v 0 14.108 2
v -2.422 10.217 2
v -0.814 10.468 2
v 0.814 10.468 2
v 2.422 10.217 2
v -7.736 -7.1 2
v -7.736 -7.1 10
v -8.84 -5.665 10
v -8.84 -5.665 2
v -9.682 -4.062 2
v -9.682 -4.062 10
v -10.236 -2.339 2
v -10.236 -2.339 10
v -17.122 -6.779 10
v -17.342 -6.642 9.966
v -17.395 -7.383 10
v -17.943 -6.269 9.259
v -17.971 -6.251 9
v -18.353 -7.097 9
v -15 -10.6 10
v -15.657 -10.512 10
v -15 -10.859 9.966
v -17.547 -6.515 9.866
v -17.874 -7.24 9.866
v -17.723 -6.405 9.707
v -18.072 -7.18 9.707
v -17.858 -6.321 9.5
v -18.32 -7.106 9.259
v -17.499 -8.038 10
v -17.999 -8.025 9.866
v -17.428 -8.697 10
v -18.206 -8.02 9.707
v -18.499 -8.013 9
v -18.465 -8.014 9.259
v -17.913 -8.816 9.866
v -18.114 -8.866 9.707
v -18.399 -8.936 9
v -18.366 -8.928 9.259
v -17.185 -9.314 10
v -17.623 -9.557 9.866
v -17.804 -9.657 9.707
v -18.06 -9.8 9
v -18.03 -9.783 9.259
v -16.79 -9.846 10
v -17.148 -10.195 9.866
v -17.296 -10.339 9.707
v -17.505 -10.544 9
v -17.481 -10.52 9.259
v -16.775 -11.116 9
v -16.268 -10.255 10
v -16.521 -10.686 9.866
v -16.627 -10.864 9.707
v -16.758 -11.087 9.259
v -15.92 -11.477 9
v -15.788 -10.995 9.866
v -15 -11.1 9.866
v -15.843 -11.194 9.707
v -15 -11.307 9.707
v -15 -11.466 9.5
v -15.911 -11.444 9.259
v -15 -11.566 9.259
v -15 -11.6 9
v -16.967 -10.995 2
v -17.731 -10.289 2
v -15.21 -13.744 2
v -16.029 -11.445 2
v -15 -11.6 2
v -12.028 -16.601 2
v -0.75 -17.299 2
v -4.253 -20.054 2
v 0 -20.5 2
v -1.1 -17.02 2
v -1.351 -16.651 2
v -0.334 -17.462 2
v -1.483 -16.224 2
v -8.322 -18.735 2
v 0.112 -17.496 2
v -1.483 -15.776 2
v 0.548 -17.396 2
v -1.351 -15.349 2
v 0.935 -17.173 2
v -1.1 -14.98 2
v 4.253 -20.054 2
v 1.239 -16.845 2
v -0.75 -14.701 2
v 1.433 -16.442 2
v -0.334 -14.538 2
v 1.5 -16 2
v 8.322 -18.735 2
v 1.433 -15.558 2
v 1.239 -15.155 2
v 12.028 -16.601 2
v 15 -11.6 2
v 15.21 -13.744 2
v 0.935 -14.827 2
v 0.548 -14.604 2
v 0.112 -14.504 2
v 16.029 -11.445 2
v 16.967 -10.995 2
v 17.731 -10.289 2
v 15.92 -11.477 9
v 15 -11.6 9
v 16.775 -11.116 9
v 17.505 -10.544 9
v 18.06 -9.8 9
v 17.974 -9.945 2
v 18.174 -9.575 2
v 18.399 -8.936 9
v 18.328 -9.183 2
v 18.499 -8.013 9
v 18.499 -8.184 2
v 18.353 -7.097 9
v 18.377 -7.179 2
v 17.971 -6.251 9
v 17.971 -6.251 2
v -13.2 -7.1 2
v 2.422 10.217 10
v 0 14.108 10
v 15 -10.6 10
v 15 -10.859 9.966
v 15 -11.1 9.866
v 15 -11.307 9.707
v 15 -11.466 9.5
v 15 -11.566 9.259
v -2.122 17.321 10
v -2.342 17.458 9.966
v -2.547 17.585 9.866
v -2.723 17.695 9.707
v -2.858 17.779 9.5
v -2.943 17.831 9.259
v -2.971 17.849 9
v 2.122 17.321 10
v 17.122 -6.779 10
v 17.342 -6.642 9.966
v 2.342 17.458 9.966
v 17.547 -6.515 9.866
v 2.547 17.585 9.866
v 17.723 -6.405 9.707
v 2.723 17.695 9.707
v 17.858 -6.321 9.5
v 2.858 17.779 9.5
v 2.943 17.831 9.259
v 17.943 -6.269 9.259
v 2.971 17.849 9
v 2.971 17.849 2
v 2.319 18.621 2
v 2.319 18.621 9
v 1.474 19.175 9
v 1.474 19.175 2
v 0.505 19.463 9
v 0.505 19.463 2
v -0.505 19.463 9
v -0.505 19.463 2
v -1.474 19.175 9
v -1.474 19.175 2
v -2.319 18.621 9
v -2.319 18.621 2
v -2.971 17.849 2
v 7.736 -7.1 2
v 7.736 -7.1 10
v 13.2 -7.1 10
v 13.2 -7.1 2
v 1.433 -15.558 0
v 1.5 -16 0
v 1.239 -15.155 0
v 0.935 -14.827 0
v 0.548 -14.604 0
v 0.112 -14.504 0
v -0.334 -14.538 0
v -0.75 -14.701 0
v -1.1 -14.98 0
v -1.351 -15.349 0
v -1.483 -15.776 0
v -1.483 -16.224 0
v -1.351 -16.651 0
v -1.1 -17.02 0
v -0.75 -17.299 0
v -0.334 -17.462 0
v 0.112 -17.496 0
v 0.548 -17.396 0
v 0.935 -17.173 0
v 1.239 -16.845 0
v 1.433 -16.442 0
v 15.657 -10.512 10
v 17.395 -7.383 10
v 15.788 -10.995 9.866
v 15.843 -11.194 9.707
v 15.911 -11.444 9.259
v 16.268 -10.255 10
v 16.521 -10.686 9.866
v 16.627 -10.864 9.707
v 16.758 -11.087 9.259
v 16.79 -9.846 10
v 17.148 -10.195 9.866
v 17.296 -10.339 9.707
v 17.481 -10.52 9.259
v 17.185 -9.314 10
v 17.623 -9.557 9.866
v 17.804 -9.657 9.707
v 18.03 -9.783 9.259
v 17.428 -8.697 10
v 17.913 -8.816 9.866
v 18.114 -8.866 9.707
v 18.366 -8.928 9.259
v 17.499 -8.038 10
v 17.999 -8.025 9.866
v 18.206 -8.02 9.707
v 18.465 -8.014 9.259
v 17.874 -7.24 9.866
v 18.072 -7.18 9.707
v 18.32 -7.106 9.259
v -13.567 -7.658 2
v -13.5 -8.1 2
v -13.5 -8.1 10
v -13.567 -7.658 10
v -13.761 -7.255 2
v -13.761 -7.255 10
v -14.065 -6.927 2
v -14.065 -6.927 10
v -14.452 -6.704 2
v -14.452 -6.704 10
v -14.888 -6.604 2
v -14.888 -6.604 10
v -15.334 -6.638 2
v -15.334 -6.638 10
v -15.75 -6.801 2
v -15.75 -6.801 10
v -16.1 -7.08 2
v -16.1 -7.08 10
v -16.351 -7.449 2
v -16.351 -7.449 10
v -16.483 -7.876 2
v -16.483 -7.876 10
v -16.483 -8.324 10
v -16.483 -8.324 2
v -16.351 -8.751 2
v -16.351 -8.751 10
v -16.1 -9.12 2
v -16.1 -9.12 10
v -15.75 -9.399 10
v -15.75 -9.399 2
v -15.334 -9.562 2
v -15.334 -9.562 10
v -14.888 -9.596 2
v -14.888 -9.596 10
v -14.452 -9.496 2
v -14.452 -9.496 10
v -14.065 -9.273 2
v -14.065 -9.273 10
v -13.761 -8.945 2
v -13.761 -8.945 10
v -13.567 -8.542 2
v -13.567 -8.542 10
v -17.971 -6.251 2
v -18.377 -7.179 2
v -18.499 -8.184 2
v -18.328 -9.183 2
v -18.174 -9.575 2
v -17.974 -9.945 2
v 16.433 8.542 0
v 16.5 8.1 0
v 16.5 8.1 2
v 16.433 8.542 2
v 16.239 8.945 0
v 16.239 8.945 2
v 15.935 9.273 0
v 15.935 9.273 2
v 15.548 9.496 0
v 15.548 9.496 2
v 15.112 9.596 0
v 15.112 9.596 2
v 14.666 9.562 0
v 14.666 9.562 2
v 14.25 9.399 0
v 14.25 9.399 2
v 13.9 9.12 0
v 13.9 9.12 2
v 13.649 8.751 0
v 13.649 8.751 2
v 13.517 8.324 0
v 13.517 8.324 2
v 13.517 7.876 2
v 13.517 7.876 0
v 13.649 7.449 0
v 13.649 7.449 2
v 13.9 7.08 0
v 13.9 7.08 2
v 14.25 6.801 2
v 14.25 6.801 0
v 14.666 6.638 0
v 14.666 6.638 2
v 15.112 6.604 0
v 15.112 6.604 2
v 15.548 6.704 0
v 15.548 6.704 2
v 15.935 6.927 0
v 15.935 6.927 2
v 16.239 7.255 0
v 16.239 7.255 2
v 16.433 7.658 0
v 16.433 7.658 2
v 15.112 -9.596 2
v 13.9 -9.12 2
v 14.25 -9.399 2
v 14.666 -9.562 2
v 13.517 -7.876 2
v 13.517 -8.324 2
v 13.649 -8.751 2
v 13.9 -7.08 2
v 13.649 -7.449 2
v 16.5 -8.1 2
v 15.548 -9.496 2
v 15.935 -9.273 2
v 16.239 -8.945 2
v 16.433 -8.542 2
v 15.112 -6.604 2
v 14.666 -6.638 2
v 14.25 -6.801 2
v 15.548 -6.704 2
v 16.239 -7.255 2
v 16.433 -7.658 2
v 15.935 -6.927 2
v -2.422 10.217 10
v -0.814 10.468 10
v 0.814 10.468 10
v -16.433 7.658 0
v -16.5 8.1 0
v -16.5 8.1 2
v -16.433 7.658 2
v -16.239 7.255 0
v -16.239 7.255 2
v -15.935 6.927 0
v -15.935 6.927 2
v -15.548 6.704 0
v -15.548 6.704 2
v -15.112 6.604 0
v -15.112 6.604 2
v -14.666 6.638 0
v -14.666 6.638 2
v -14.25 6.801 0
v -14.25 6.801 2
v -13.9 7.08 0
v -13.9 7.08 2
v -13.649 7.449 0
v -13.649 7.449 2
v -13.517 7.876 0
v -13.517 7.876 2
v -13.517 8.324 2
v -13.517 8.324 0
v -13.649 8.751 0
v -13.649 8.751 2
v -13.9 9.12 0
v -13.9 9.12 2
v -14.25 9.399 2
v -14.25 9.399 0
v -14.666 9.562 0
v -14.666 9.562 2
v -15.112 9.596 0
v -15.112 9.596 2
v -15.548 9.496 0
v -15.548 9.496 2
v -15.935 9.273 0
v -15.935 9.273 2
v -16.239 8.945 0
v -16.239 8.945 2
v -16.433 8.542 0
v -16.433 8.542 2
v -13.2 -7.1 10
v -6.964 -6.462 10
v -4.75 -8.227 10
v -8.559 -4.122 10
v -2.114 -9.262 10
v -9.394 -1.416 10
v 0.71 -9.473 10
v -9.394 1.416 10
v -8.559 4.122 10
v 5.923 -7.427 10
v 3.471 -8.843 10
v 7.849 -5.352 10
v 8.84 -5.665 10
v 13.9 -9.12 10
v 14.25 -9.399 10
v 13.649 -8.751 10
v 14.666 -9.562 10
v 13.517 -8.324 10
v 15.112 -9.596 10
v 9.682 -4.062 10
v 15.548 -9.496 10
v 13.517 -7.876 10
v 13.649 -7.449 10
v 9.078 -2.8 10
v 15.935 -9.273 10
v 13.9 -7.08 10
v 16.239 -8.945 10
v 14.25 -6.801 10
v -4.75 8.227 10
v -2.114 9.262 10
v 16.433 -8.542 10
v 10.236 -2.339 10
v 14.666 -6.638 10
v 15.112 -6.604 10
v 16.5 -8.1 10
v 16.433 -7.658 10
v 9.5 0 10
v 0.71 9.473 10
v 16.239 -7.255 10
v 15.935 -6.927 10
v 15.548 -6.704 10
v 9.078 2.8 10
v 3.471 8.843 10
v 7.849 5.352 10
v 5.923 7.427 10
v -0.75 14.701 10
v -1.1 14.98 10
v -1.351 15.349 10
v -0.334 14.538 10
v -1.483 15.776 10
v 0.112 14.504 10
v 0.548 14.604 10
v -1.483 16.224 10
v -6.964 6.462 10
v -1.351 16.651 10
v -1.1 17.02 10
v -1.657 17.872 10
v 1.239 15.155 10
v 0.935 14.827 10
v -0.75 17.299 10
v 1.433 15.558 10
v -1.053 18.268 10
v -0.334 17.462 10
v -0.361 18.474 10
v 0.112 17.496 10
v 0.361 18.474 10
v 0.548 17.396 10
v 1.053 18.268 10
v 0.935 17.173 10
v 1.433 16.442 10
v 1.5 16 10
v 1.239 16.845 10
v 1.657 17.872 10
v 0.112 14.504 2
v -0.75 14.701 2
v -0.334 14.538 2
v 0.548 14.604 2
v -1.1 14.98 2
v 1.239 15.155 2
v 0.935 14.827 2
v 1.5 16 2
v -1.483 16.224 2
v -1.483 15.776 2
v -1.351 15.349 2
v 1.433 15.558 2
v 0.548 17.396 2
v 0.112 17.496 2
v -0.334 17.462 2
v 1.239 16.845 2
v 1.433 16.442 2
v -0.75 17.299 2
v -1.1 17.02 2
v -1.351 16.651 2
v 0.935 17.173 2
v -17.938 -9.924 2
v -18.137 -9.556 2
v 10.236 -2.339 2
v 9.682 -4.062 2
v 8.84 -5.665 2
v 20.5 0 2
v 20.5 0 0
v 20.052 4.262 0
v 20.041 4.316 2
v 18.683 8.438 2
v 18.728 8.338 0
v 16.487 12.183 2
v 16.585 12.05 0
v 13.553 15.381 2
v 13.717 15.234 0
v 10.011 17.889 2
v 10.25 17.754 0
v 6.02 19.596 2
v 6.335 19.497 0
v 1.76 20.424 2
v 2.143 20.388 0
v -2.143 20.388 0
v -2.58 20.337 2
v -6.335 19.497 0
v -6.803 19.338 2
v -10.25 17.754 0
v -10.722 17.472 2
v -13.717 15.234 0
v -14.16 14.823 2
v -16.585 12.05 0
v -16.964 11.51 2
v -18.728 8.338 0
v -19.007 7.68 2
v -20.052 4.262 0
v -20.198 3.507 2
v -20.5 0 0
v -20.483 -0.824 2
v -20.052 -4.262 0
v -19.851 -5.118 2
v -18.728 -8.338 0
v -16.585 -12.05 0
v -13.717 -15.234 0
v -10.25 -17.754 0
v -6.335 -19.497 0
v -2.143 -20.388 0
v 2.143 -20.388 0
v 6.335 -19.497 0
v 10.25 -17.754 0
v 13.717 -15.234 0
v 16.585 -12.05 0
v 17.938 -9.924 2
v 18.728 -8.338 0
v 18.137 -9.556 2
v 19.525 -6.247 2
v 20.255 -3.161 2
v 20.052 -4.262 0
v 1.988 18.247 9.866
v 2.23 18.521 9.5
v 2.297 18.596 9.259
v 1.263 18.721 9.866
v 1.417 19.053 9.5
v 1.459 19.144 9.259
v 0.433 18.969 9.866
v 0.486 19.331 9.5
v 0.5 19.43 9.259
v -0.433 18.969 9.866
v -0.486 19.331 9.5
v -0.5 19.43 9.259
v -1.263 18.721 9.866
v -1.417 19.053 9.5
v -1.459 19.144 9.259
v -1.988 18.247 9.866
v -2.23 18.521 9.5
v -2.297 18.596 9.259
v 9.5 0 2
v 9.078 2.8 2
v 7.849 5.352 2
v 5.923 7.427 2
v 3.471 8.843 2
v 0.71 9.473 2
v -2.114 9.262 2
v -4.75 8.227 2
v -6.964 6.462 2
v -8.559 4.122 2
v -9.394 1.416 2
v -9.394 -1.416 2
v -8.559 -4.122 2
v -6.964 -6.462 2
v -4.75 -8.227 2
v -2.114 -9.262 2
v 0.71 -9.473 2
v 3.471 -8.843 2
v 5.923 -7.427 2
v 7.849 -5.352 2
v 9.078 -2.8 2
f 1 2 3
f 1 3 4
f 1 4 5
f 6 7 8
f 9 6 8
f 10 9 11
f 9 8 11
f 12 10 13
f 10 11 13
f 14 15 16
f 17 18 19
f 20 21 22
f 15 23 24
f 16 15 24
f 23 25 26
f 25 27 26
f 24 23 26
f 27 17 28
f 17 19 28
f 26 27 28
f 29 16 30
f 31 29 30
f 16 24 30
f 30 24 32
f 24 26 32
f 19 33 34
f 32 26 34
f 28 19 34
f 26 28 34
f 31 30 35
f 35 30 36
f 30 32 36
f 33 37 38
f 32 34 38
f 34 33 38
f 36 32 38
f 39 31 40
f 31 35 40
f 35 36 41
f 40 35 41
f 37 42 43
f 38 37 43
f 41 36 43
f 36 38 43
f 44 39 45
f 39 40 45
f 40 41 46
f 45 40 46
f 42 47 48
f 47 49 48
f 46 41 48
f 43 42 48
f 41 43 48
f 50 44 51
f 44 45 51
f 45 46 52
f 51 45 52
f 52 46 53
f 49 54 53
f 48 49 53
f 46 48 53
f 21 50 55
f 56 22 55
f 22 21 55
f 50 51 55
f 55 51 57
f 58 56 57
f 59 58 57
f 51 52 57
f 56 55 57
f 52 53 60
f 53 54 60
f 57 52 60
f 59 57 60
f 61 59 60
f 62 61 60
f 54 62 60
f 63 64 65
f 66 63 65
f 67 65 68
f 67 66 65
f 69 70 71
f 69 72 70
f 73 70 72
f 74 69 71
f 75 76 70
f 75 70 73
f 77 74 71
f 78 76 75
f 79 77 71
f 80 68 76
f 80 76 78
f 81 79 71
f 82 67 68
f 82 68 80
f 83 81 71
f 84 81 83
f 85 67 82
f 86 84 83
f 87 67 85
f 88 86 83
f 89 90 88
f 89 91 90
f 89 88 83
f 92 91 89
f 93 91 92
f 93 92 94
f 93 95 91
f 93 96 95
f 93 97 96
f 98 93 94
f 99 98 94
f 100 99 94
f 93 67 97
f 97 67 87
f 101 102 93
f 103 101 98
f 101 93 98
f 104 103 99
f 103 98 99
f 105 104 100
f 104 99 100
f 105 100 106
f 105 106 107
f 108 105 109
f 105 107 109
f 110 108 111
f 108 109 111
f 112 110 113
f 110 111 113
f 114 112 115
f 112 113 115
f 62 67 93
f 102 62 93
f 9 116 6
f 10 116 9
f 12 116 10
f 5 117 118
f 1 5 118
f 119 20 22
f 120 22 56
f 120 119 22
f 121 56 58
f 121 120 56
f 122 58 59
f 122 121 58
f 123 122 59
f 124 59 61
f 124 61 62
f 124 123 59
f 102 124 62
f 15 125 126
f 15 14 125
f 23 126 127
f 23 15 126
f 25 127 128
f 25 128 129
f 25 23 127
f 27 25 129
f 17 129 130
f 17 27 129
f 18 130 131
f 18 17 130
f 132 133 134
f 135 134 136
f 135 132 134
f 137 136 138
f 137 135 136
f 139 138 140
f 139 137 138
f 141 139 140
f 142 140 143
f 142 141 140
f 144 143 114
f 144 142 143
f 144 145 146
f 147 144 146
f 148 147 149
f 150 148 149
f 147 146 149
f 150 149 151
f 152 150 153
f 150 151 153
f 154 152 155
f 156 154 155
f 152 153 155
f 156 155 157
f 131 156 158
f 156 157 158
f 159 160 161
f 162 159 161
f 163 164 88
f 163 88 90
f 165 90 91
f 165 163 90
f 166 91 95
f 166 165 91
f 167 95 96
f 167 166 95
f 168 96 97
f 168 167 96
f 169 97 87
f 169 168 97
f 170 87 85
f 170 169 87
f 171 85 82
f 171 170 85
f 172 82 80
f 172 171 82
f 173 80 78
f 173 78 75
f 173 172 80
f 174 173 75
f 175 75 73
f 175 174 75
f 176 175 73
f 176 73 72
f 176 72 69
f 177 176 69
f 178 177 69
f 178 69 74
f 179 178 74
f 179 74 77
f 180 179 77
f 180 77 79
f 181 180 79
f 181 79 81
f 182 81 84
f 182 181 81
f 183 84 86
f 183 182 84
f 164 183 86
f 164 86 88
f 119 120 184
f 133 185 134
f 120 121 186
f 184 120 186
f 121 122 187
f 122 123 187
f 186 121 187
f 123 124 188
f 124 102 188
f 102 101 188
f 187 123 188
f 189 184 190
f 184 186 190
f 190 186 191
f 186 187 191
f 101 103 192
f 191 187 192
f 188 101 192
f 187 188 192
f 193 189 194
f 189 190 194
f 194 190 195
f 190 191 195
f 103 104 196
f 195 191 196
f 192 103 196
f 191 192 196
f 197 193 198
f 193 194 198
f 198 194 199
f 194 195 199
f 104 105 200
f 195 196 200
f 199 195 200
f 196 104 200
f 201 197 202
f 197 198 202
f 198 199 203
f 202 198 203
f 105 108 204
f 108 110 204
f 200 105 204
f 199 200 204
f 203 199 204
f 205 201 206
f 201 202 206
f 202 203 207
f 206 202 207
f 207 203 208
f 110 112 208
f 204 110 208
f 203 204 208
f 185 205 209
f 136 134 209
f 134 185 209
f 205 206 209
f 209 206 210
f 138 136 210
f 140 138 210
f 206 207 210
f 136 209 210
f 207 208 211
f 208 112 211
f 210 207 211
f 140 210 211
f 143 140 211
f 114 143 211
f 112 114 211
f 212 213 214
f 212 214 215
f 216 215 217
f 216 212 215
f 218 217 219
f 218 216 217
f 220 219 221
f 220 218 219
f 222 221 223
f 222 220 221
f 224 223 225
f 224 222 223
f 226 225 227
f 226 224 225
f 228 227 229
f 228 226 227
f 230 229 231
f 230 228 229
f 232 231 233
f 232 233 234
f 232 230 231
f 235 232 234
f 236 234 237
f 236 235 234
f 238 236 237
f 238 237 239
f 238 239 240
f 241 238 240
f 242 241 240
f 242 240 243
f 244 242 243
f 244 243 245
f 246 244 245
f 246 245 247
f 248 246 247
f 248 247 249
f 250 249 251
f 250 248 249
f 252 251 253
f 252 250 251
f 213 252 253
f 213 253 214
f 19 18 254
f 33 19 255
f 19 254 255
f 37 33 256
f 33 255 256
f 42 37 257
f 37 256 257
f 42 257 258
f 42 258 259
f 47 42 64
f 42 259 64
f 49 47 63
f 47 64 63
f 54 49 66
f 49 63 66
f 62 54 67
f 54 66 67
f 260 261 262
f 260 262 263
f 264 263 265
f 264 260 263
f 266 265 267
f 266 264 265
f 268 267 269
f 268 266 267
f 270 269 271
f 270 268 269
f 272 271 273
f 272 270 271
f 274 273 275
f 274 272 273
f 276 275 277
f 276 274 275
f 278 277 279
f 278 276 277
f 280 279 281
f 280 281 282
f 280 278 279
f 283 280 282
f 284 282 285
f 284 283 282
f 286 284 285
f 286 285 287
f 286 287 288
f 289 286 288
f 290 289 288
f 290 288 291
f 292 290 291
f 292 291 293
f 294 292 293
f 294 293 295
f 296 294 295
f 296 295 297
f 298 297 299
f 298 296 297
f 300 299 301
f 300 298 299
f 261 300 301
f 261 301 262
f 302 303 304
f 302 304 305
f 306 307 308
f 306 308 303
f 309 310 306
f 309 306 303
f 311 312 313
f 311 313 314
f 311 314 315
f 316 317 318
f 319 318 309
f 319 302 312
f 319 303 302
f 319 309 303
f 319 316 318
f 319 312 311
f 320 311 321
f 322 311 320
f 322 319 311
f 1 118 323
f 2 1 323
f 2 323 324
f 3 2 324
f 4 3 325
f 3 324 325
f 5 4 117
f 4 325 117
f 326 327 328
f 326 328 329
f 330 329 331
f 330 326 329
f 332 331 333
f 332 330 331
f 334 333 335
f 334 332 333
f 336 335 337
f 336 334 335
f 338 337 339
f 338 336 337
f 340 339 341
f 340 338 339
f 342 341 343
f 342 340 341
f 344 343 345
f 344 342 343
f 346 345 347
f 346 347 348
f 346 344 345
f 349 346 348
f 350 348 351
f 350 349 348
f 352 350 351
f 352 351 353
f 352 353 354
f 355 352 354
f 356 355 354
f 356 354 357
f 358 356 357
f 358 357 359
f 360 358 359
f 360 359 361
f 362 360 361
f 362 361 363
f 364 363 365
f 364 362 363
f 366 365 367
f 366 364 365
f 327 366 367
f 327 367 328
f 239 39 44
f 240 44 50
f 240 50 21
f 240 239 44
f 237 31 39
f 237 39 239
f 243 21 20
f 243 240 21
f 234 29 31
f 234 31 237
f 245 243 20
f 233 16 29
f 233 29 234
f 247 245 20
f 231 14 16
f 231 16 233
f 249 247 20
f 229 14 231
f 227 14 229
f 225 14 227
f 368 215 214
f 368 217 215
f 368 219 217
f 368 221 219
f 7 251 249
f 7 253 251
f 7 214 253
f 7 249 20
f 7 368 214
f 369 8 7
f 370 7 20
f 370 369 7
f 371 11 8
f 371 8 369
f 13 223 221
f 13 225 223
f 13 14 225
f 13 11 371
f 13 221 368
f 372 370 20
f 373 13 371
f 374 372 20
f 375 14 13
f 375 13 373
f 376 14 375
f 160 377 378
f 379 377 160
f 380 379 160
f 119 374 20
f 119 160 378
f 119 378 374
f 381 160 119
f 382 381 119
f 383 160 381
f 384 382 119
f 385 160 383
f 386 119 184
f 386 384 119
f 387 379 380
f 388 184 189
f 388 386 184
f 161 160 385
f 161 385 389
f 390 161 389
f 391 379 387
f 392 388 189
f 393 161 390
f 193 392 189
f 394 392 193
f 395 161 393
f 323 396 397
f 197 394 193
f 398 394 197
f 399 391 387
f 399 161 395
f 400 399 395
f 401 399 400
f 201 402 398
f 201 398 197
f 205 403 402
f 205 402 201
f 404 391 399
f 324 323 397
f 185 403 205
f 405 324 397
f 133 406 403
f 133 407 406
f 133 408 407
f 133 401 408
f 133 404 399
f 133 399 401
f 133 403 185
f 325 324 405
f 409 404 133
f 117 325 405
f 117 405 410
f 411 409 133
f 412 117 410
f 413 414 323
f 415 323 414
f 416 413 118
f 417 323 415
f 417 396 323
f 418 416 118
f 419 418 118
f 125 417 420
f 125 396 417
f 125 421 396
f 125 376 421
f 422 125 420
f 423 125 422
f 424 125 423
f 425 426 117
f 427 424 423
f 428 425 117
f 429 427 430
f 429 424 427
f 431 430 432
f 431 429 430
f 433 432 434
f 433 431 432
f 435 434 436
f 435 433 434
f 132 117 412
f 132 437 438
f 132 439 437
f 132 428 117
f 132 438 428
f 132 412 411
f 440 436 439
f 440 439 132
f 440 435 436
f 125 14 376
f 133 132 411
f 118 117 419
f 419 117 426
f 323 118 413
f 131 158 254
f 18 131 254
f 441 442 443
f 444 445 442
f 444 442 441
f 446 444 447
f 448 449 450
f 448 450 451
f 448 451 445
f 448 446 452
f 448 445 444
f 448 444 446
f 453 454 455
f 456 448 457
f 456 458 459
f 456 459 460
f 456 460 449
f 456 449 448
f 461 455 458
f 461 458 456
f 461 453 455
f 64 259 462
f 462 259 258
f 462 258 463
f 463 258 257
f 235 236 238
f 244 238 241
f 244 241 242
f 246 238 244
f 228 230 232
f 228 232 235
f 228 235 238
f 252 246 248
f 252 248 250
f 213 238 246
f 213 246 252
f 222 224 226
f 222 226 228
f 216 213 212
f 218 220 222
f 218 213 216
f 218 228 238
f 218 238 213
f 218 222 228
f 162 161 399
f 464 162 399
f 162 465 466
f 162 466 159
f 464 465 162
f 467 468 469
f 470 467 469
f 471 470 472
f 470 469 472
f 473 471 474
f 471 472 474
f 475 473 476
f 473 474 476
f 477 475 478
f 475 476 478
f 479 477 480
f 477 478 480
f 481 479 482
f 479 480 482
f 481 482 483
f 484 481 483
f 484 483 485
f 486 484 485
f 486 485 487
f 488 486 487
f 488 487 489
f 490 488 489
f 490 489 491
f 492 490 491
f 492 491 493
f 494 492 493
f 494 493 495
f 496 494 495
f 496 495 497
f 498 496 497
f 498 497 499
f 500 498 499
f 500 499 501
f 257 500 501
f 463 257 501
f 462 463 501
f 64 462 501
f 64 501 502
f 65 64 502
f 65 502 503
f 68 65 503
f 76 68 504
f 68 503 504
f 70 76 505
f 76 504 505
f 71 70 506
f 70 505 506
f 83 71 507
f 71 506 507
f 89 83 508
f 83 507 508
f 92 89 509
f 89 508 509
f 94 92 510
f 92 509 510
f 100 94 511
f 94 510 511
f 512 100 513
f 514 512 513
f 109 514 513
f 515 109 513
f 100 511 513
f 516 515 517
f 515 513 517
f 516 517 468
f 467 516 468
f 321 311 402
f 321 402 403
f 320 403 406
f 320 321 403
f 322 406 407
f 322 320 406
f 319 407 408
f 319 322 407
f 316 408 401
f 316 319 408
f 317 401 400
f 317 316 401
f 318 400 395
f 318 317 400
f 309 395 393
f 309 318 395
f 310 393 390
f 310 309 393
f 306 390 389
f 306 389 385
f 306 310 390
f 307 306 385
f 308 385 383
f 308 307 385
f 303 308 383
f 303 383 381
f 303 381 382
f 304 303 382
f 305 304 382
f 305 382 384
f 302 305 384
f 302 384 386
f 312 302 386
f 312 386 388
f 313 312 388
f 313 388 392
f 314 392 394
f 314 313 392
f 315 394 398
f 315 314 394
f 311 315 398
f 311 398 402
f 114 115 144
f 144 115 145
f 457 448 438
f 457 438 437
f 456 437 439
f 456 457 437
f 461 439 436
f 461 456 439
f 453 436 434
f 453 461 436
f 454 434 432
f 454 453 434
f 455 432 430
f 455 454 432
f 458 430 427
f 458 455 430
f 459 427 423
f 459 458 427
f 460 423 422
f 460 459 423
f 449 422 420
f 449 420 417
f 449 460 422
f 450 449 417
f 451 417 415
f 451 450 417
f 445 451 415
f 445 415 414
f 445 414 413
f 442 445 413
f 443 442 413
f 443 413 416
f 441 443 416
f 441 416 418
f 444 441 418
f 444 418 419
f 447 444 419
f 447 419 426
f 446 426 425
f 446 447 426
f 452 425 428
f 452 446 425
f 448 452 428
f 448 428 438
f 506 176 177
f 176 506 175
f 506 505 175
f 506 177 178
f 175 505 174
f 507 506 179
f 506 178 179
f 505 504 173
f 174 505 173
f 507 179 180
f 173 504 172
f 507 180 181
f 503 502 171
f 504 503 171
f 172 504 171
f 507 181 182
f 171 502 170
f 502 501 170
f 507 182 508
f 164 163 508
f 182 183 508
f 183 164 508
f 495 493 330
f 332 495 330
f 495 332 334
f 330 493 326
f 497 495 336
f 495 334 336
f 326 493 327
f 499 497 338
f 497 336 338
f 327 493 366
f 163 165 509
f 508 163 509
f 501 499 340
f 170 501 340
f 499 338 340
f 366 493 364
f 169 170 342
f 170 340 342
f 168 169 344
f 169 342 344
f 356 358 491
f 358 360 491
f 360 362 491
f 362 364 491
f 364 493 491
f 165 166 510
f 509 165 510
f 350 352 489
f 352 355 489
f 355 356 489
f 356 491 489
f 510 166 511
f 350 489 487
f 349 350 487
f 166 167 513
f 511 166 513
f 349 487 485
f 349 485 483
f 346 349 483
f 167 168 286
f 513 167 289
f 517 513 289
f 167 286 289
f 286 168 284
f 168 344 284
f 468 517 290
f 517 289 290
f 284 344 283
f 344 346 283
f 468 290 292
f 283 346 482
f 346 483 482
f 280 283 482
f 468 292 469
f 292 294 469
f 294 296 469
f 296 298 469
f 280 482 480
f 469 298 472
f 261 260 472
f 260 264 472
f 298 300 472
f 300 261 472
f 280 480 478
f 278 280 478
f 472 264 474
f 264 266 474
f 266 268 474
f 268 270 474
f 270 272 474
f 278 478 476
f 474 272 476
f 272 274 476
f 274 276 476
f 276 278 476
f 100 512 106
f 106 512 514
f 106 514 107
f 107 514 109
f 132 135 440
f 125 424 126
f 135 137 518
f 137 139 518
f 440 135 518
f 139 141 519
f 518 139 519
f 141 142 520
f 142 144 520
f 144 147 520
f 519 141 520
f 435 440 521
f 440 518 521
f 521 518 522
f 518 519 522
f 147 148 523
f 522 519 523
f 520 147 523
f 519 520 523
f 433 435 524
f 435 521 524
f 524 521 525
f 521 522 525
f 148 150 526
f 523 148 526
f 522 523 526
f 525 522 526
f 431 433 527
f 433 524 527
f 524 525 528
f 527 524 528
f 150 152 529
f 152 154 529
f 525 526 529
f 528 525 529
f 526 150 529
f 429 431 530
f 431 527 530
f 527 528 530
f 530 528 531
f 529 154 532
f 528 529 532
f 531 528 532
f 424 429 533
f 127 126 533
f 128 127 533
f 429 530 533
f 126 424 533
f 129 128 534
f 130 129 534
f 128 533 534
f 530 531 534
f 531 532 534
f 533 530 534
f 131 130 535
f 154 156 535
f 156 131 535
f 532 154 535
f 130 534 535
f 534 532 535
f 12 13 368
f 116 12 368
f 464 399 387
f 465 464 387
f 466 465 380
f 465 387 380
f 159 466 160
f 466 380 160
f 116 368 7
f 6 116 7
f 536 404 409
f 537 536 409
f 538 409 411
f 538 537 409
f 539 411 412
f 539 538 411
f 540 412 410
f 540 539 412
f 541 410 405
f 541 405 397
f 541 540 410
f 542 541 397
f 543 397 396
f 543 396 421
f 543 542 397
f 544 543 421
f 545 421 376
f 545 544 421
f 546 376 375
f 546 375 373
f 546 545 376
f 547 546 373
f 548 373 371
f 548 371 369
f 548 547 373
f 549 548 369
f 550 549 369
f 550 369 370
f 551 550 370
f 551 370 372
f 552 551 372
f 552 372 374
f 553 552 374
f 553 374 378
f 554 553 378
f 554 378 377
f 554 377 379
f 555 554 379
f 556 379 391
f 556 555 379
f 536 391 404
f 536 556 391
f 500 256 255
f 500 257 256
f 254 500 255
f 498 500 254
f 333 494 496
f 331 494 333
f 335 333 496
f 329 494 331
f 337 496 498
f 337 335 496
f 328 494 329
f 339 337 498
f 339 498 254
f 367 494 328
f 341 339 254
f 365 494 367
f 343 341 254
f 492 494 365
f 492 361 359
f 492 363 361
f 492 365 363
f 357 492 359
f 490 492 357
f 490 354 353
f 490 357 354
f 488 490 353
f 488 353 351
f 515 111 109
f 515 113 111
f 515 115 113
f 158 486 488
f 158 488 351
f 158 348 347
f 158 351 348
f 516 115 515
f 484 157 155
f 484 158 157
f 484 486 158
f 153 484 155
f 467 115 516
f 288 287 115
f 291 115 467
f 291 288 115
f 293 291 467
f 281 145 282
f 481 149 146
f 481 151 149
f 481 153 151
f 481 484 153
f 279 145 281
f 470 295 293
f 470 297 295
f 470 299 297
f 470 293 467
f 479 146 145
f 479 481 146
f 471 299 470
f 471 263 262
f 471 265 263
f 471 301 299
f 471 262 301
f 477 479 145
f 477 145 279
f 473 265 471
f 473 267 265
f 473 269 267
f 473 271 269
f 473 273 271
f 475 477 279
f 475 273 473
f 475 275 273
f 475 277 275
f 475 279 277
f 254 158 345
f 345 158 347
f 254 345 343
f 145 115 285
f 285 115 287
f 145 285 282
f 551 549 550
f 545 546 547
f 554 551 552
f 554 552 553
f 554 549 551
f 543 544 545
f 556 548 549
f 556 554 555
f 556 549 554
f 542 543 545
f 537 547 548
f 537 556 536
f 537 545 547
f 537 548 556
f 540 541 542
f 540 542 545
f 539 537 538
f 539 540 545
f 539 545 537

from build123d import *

# Parameters (mm, degrees)
CROQUIS1_R              = 20.5
CROQUIS1_R_2            = 1.5
SALIENTE_EXTRUIR1_DEPTH = 2
CROQUIS2_R              = 11.5
CROQUIS2_R_2            = 9.5
SALIENTE_EXTRUIR2_DEPTH = 8
CROQUIS3_R              = 1.5
CROQUIS3_R_2            = 9.5
SALIENTE_EXTRUIR4_DEPTH = 8
REDONDEO1_R             = 1
CORTAR_EXTRUIR1_DEPTH   = 8


with BuildPart() as part:
    # Croquis1 → Saliente-Extruir1 (new body)
    with BuildSketch(Plane.XY):
        Circle(CROQUIS1_R)
        with Locations((15, 8.1)):
            Circle(CROQUIS1_R_2, mode=Mode.SUBTRACT)
        with Locations((0, -16)):
            Circle(CROQUIS1_R_2, mode=Mode.SUBTRACT)
        with Locations(Location((-15, 8.1, 0), (0, 0, 180))):
            Circle(CROQUIS1_R_2, mode=Mode.SUBTRACT)
    extrude(amount=SALIENTE_EXTRUIR1_DEPTH)

    # Croquis2 → Saliente-Extruir2 (add)
    with BuildSketch(Plane.XY.offset(2)):
        Circle(CROQUIS2_R)
        Circle(CROQUIS2_R_2, mode=Mode.SUBTRACT)
    extrude(amount=SALIENTE_EXTRUIR2_DEPTH)

    # Croquis3 → Saliente-Extruir4 (add)
    with BuildSketch(Plane.XY.offset(2)):
        with BuildLine():
            Line((-15, -11.6), (15, -11.6))
            ThreePointArc((15, -11.6), (18.059663437, -9.799546895), (17.971452283, -6.250548371))
            Line((17.971452283, -6.250548371), (2.971452283, 17.849451629))
            ThreePointArc((2.971452283, 17.849451629), (0, 19.5), (-2.971452283, 17.849451629))
            Line((-2.971452283, 17.849451629), (-17.971452283, -6.250548371))
            ThreePointArc((-17.971452283, -6.250548371), (-18.059663437, -9.799546895), (-15, -11.6))
        make_face()
        with Locations((15, -8.1)):
            Circle(CROQUIS3_R, mode=Mode.SUBTRACT)
        with Locations((-15, -8.1)):
            Circle(CROQUIS3_R, mode=Mode.SUBTRACT)
        with Locations((0, 16)):
            Circle(CROQUIS3_R, mode=Mode.SUBTRACT)
        Circle(CROQUIS3_R_2, mode=Mode.SUBTRACT)
    extrude(amount=SALIENTE_EXTRUIR4_DEPTH)

    # Redondeo1
    redondeo1_edges = [part.edges().sort_by_distance(p)[0] for p in [
        (-10.471452283, 5.799451629, 10),
        (-18.059663437, -9.799546895, 10),
        (0, -11.6, 10),
        (18.059663437, -9.799546895, 10),
        (10.471452283, 5.799451629, 10),
        (0, 19.5, 10),
    ]]
    fillet(redondeo1_edges, radius=REDONDEO1_R)

    # Croquis4 → Cortar-Extruir1 (cut)
    with BuildSketch(Plane.XY.offset(10)):
        with BuildLine():
            Line((-10.236239063, -2.338676942), (-13.199718145, -7.1))
            Line((-13.199718145, -7.1), (-7.735631842, -7.1))
            ThreePointArc((-7.735631842, -7.1), (-9.295944561, -4.882152673), (-10.236239063, -2.338676942))
        make_face()
        with BuildLine():
            Line((2.421529631, 10.216956212), (0, 14.107547153))
            Line((0, 14.107547153), (-2.421529631, 10.216956212))
            ThreePointArc((-2.421529631, 10.216956212), (0, 10.5), (2.421529631, 10.216956212))
        make_face()
        with BuildLine():
            Line((7.735631842, -7.1), (13.199718145, -7.1))
            Line((13.199718145, -7.1), (10.236239063, -2.338676942))
            ThreePointArc((10.236239063, -2.338676942), (9.295944561, -4.882152673), (7.735631842, -7.1))
        make_face()
    extrude(amount=-CORTAR_EXTRUIR1_DEPTH, mode=Mode.SUBTRACT)


solid = part.part
